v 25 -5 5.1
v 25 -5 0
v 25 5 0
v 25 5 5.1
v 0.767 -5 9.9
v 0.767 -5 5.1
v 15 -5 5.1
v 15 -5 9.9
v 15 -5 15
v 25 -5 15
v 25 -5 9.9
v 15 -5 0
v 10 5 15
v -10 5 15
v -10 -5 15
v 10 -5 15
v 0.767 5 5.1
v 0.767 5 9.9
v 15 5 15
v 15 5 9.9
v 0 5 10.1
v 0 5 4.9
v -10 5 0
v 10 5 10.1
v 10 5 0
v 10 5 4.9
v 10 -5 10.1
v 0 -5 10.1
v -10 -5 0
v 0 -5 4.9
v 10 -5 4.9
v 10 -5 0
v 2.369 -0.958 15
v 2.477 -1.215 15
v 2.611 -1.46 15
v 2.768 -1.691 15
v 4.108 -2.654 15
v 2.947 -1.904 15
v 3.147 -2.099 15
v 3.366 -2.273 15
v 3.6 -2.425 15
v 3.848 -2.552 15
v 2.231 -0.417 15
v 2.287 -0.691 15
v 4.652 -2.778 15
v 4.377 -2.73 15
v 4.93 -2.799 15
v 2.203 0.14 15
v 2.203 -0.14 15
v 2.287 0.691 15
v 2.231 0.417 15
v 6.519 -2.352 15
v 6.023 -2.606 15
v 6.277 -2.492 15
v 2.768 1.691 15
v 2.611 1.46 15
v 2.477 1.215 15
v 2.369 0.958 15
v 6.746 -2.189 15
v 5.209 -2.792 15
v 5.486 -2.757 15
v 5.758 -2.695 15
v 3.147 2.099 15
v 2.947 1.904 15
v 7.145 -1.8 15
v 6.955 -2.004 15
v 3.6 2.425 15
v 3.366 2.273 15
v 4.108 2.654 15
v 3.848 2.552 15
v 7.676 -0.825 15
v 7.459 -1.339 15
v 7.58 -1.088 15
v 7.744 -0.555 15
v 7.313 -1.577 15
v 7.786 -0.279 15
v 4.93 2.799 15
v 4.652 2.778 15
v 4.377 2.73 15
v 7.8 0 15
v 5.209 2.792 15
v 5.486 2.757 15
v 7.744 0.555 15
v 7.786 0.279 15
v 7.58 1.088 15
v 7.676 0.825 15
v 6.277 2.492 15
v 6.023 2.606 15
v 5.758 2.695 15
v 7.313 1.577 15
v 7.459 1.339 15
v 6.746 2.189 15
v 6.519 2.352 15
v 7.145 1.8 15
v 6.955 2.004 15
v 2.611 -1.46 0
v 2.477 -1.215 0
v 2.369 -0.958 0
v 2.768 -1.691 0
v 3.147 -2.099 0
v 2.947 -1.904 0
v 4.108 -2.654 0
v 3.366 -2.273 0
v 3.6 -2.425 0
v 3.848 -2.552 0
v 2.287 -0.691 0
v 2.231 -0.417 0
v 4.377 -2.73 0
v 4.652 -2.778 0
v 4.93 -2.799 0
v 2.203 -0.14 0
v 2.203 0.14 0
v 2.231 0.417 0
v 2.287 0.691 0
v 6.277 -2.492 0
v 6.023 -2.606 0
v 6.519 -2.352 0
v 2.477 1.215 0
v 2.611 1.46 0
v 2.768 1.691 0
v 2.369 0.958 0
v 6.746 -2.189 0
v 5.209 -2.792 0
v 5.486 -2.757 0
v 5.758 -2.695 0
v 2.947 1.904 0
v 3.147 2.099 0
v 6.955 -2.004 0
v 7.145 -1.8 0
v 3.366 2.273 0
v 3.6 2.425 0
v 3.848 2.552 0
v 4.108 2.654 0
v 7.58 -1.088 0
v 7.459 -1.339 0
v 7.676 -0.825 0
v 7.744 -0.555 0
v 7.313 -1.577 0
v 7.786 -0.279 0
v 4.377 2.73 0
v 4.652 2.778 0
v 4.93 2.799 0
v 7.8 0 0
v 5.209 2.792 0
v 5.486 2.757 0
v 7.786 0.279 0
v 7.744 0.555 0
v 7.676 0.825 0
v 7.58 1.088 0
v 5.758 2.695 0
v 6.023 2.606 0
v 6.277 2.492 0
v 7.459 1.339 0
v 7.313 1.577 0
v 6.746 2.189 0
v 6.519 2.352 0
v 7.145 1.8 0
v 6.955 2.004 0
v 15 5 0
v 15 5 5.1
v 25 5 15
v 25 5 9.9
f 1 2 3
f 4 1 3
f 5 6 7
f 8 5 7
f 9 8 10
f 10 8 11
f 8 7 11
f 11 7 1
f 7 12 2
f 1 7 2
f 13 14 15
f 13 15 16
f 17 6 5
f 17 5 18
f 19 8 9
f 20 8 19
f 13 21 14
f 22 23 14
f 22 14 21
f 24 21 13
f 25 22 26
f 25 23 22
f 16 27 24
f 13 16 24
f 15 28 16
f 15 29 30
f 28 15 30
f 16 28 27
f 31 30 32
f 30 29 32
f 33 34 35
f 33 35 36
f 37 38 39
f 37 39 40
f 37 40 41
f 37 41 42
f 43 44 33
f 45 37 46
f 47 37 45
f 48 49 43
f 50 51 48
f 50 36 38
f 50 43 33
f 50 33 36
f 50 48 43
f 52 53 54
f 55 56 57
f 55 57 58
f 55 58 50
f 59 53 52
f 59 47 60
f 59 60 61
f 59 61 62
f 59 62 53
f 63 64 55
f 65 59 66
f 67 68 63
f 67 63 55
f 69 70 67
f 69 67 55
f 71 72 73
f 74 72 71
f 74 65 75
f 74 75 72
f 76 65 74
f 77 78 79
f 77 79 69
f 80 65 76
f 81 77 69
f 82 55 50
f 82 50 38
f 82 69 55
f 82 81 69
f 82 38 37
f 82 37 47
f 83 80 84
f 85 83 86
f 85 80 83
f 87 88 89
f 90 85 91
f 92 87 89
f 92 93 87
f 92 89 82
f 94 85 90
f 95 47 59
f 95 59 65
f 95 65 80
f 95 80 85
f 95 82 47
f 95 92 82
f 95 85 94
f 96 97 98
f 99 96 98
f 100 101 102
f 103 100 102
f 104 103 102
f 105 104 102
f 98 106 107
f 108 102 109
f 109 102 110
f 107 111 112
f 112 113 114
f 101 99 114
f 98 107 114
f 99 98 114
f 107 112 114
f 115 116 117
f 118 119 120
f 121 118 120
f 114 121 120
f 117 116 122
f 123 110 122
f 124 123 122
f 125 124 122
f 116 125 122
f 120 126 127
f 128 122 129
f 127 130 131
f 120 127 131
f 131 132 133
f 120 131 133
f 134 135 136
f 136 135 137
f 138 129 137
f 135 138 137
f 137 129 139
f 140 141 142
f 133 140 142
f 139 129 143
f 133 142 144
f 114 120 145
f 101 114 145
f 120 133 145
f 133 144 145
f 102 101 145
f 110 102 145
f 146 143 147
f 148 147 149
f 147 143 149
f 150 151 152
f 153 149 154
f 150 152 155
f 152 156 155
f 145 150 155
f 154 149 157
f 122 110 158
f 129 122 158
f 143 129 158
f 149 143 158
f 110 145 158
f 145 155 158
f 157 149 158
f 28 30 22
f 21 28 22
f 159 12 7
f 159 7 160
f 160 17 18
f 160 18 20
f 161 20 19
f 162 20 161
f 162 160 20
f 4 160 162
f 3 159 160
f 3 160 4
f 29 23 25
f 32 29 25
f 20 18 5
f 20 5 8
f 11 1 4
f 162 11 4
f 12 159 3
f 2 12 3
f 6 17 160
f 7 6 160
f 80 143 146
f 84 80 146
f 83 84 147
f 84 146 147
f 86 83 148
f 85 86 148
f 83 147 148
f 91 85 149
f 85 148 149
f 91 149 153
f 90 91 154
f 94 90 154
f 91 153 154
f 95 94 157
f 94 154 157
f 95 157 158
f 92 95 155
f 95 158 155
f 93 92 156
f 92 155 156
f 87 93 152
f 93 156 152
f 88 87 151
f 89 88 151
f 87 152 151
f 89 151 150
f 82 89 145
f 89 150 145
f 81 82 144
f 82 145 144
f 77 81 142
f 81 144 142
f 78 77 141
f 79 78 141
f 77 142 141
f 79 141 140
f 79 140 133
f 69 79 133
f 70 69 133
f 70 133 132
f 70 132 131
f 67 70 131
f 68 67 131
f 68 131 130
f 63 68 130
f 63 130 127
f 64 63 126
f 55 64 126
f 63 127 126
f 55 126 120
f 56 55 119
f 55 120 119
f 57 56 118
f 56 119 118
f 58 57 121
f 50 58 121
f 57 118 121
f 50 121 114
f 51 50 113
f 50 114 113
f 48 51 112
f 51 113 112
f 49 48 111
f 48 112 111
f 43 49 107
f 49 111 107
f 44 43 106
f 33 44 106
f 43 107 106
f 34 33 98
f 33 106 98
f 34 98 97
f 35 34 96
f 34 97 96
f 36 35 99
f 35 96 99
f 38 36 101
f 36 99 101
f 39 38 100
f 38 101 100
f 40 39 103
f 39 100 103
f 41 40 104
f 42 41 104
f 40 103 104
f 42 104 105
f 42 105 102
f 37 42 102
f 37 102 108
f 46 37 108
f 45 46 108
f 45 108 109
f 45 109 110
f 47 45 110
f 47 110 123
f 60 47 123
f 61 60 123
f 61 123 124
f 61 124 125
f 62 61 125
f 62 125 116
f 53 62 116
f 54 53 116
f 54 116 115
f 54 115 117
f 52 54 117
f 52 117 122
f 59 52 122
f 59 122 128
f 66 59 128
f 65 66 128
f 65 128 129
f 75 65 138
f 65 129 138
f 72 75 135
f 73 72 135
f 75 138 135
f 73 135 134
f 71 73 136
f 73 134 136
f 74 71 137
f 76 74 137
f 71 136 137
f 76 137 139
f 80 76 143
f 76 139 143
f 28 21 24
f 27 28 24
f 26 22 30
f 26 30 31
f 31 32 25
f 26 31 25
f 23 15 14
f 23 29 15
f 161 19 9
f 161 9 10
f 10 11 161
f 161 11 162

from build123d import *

# Parameters (mm, degrees)
SKETCH_W       = 20
SKETCH_H       = 10
PAD_DEPTH      = 4.9
SKETCH001_W    = 10
SKETCH001_H    = 10
PAD001_DEPTH   = 5.2
SKETCH002_W    = 20
SKETCH002_H    = 10
PAD002_DEPTH   = 4.9
SKETCH004_W    = 10
SKETCH004_H    = 10
PAD003_DEPTH   = 5.1
SKETCH005_W    = 24.232915
SKETCH005_H    = 10
PAD004_DEPTH   = 4.8
SKETCH006_W    = 10
SKETCH006_H    = 10
PAD005_DEPTH   = 5.1
CYLINDER_R     = 2.8
CYLINDER_DEPTH = 15


with BuildPart() as pad002:
    # Sketch → Pad (new body)
    with BuildSketch(Plane.XY):
        Rectangle(SKETCH_W, SKETCH_H)
    extrude(amount=PAD_DEPTH)

    # Sketch001 → Pad001 (new body)
    with BuildSketch(Plane.XY.offset(4.9)):
        with Locations((-5, 0)):
            Rectangle(SKETCH001_W, SKETCH001_H)
    extrude(amount=PAD001_DEPTH)

    # Sketch002 → Pad002 (new body)
    with BuildSketch(Plane.XY.offset(10.1)):
        Rectangle(SKETCH002_W, SKETCH002_H)
    extrude(amount=PAD002_DEPTH)


with BuildPart() as pad005:
    # Sketch004 → Pad003 (new body)
    with BuildSketch(Plane.XY):
        with Locations((20, 0)):
            Rectangle(SKETCH004_W, SKETCH004_H)
    extrude(amount=PAD003_DEPTH)

    # Sketch005 → Pad004 (new body)
    with BuildSketch(Plane.XY.offset(5.1)):
        with Locations((12.883543, 0)):
            Rectangle(SKETCH005_W, SKETCH005_H)
    extrude(amount=PAD004_DEPTH)

    # Sketch006 → Pad005 (new body)
    with BuildSketch(Plane.XY.offset(9.9)):
        with Locations((20, 0)):
            Rectangle(SKETCH006_W, SKETCH006_H)
    extrude(amount=PAD005_DEPTH)


with BuildPart() as cylinder:
    # Cylinder → Cylinder (new body)
    with BuildSketch(Plane(origin=(5, 0, 0), x_dir=(1, 0, 0), z_dir=(0, 0, 1))):
        Circle(CYLINDER_R)
    extrude(amount=CYLINDER_DEPTH)


solid = Compound([pad002.part, pad005.part, cylinder.part])
